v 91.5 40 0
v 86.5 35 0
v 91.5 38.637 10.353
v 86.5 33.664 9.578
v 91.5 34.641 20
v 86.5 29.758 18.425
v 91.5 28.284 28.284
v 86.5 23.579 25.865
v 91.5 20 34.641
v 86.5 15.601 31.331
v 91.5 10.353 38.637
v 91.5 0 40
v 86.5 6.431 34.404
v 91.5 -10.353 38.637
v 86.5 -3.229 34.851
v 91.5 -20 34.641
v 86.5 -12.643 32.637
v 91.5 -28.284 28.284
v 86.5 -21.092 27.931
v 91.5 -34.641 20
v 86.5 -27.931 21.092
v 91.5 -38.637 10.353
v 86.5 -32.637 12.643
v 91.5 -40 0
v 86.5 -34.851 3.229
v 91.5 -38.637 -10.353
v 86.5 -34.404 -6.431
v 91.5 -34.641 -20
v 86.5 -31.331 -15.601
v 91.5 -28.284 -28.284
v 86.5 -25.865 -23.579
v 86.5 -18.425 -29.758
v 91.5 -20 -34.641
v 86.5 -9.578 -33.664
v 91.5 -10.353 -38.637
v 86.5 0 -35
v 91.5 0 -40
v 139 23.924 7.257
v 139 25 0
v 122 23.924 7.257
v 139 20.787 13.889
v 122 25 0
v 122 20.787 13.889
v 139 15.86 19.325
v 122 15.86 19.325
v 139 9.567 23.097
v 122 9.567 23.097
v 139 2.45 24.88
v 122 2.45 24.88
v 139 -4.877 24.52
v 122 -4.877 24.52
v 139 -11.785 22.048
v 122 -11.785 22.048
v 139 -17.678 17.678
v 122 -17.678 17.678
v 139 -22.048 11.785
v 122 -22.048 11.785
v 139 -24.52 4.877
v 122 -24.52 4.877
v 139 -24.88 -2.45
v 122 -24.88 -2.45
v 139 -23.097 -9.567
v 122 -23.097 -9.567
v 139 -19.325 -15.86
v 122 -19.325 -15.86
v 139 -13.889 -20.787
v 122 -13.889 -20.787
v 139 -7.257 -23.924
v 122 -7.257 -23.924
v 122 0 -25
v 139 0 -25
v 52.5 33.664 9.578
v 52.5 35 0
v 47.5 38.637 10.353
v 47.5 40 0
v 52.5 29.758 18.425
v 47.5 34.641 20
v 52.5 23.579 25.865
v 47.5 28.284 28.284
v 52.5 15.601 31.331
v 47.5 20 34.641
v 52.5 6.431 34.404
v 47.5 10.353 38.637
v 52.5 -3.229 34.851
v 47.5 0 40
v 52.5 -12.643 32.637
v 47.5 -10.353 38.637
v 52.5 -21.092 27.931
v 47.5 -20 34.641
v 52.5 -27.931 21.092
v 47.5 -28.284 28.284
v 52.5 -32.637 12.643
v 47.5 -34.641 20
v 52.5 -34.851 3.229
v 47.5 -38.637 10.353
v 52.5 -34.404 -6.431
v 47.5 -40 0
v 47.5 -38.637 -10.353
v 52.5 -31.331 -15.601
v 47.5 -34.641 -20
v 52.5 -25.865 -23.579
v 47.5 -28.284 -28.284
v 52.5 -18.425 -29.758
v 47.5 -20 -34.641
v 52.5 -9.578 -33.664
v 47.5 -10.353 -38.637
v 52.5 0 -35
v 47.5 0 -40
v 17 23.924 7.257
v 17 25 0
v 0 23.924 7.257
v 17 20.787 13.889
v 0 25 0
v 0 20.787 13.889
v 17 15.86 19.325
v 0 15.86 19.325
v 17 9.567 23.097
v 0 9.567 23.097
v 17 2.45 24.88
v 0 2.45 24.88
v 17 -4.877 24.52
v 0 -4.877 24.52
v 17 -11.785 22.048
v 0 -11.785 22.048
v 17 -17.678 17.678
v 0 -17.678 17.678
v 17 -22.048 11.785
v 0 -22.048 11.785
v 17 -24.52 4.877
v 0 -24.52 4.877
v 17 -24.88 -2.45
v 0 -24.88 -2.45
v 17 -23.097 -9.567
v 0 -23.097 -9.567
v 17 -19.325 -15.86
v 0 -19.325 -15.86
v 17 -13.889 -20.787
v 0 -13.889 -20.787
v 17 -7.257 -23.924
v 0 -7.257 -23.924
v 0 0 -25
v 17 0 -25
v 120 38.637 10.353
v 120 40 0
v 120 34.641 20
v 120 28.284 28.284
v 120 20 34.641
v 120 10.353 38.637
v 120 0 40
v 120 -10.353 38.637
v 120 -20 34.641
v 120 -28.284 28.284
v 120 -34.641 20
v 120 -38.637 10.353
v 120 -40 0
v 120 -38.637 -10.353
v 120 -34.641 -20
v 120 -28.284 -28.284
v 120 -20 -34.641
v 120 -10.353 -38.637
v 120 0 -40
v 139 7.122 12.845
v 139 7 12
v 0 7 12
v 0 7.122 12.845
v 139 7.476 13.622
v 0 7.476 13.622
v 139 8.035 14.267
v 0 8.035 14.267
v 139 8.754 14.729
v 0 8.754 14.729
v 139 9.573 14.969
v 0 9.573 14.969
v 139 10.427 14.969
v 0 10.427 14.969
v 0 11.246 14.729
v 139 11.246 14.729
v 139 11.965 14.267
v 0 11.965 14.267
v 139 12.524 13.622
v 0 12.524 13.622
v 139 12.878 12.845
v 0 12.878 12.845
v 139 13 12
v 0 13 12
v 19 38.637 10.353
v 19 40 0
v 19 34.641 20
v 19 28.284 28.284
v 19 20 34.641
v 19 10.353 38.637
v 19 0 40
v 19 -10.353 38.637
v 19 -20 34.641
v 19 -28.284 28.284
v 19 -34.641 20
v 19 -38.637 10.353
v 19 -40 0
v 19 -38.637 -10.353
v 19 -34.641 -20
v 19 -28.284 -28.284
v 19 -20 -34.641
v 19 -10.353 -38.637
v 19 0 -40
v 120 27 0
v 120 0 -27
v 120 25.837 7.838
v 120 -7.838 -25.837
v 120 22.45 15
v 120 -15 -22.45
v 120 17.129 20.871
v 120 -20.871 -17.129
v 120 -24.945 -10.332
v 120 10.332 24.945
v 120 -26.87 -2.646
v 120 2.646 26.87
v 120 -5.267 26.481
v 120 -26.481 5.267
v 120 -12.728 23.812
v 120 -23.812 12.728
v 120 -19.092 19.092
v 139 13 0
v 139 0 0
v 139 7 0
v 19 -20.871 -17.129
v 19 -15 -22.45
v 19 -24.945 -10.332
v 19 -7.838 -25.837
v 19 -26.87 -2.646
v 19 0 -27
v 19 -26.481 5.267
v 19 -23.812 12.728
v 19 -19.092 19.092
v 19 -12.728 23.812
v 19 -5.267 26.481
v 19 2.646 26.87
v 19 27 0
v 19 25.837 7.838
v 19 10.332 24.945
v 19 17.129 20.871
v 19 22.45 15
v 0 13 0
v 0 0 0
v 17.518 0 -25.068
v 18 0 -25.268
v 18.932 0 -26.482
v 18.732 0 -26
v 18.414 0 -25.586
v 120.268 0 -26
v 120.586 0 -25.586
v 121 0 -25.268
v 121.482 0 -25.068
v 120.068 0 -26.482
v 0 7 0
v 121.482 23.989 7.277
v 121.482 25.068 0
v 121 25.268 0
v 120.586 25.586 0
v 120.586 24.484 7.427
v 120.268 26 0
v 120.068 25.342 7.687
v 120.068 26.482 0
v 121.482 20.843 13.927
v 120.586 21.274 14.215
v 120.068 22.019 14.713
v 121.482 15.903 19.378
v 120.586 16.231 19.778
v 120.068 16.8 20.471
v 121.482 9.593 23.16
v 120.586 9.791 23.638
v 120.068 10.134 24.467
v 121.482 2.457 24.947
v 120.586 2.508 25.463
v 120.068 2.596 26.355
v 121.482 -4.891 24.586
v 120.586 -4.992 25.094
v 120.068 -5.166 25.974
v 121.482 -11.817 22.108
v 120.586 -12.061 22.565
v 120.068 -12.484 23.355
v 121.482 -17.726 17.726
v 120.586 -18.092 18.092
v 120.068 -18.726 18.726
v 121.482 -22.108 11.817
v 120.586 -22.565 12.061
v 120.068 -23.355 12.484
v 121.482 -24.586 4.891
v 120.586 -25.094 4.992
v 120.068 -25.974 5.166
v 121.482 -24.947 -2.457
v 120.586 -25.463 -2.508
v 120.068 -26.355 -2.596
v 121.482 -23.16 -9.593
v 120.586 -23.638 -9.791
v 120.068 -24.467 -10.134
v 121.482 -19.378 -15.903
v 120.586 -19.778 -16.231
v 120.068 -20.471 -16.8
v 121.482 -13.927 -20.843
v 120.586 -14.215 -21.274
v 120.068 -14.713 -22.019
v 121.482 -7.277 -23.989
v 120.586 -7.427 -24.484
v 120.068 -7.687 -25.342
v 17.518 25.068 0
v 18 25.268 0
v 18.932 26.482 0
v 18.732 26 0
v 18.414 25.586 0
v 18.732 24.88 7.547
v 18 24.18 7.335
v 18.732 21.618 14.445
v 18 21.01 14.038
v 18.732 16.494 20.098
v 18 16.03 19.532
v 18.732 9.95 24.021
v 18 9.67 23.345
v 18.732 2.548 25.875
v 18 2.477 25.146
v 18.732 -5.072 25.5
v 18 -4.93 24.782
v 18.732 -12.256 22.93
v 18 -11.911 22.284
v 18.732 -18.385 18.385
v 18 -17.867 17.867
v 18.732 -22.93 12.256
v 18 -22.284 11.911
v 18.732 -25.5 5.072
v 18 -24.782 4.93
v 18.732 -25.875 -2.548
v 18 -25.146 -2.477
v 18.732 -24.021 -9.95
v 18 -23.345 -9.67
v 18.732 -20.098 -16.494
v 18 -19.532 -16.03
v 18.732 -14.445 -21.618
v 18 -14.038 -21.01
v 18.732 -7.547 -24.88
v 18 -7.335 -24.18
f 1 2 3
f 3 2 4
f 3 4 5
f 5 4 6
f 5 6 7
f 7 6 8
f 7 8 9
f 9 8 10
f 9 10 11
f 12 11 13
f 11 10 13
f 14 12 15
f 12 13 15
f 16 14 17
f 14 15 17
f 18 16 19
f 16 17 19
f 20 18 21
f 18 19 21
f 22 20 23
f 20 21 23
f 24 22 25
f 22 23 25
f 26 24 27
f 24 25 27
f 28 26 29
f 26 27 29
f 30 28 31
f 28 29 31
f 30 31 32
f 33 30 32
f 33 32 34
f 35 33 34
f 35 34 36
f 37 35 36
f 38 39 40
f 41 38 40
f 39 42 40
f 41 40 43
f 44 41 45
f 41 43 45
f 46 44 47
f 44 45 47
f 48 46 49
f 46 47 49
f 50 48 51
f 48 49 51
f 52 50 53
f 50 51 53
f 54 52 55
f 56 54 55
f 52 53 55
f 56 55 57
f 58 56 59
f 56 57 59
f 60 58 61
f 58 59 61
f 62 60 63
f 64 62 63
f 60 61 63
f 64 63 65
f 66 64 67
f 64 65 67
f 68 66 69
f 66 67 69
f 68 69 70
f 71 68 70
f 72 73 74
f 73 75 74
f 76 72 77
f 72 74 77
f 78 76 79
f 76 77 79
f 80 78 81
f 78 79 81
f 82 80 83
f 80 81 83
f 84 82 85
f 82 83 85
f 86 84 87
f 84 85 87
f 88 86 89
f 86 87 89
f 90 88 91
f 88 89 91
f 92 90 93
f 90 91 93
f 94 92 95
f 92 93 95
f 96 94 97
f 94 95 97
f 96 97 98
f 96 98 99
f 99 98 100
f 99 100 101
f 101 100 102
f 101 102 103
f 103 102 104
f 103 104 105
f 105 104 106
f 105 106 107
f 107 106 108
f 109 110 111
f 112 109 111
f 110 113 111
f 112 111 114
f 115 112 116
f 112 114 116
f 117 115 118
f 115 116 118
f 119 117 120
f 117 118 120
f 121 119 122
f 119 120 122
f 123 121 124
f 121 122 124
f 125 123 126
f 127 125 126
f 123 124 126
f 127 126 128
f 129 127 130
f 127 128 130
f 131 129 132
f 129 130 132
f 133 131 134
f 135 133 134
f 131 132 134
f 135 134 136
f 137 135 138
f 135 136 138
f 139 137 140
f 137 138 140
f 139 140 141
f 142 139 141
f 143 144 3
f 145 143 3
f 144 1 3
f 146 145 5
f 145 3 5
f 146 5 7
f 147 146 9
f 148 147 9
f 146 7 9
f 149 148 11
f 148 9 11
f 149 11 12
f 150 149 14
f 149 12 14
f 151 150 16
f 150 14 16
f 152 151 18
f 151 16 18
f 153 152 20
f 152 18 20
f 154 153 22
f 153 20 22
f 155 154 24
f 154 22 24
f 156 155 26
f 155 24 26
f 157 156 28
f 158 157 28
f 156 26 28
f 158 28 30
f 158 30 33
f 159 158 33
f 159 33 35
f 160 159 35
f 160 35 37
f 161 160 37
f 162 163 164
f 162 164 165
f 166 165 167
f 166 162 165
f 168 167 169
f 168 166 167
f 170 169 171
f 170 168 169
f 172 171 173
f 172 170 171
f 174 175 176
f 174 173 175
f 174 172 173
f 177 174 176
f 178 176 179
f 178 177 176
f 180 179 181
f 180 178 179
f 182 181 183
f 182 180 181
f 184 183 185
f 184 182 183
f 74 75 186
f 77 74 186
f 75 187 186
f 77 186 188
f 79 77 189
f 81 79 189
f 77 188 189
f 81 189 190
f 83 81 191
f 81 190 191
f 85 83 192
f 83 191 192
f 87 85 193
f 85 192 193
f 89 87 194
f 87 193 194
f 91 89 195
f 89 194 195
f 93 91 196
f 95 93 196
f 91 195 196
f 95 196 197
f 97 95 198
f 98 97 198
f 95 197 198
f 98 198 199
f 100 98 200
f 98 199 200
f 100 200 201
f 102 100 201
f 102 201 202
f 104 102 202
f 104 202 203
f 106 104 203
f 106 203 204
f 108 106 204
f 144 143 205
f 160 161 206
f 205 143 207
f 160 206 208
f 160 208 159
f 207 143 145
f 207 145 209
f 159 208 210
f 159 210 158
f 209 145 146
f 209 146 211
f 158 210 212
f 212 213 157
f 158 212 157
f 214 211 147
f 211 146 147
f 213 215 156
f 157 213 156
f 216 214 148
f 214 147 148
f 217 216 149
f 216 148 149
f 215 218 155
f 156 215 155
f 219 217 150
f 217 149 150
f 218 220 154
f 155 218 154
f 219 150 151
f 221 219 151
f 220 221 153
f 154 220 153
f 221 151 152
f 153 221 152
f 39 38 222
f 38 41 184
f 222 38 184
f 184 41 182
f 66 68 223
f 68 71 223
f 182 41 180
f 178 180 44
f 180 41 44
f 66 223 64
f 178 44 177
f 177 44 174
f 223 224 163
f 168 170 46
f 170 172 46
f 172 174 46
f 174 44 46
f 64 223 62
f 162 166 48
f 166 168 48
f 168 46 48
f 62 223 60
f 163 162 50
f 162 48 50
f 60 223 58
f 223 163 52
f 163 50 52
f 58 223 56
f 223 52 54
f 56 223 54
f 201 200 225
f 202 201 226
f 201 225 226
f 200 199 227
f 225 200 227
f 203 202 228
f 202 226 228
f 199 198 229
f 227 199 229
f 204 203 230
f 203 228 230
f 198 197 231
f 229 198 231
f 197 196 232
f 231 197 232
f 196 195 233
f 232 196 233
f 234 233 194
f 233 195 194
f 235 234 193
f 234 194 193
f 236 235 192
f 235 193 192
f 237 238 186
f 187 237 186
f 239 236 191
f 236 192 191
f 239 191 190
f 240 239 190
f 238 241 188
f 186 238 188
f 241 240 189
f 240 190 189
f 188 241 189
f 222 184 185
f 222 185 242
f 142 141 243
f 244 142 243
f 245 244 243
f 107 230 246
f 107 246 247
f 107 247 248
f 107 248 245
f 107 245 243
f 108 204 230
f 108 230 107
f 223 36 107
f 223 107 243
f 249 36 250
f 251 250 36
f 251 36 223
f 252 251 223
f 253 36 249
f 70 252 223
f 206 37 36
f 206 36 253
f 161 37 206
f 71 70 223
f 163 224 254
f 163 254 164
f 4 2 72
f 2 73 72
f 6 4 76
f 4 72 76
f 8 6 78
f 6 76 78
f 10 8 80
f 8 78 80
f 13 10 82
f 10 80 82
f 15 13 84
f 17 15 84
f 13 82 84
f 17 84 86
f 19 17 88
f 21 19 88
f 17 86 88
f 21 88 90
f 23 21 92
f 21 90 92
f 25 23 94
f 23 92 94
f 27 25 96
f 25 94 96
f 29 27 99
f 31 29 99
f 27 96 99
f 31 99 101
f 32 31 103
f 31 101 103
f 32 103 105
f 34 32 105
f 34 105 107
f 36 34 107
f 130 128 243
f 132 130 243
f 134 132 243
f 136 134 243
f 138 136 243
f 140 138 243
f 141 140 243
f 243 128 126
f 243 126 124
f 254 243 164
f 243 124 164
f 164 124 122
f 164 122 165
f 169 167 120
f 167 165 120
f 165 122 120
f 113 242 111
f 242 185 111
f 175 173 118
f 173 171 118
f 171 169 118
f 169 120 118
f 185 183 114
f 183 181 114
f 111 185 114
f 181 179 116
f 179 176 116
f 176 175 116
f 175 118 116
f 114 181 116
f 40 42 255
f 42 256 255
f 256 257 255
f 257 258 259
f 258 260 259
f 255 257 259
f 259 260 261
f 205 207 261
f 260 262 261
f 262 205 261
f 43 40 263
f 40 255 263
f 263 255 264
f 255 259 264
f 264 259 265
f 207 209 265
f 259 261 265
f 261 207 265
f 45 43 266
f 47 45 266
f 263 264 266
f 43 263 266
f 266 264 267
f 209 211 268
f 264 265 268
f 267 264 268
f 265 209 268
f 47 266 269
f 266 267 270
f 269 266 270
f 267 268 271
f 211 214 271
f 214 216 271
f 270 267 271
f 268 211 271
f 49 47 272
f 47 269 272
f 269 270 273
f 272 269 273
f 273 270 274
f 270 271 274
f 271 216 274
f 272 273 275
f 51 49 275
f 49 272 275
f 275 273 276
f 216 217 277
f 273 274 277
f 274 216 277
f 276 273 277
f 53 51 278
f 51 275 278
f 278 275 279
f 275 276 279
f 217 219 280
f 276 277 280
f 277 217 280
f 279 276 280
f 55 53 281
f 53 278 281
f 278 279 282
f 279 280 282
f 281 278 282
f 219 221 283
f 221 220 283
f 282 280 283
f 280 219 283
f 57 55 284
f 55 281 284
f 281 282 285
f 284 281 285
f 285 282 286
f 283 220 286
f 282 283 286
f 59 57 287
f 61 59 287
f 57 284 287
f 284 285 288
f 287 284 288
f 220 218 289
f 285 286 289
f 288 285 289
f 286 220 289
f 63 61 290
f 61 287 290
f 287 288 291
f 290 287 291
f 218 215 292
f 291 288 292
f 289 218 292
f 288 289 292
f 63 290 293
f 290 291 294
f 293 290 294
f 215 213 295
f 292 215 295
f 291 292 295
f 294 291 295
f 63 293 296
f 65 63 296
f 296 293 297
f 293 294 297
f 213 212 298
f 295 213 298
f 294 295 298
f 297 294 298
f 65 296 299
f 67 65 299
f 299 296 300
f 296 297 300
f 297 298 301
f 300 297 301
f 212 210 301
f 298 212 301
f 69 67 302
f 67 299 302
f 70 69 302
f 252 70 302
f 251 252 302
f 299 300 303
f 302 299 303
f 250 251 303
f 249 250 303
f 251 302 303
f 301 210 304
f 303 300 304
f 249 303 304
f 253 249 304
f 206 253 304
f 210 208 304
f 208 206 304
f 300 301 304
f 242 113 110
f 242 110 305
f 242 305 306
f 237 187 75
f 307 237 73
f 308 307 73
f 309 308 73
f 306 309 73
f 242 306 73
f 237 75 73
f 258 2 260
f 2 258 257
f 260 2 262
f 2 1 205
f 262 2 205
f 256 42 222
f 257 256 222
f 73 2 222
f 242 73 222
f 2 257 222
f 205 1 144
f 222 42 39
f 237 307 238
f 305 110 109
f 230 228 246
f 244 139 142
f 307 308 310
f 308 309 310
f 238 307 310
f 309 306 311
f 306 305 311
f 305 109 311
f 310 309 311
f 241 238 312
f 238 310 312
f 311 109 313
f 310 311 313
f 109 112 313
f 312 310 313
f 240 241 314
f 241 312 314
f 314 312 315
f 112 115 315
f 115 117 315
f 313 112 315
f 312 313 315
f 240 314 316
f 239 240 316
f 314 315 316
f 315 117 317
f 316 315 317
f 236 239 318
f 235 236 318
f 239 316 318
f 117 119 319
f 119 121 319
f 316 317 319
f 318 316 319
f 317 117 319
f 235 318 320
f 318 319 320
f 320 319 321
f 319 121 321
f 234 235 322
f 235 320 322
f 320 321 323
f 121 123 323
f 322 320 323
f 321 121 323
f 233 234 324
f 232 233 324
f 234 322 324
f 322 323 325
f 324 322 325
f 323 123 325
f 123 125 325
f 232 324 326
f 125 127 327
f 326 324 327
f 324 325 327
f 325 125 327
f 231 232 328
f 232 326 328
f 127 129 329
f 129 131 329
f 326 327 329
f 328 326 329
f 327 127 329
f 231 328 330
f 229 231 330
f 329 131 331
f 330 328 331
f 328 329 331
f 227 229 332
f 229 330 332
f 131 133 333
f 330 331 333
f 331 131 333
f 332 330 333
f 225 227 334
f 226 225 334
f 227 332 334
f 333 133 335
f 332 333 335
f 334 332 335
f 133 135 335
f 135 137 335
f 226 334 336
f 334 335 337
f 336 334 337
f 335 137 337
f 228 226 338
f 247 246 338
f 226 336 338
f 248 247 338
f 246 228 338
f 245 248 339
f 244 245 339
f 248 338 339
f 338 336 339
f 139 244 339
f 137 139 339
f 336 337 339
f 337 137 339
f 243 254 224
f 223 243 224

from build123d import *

# Parameters (mm, degrees)
REVOLVE2_ANGLE     = 270
CUT_EXTRUDE1_DEPTH = 151.069983674


with BuildPart() as part:
    # Sketch1 → Revolve2 (revolve)
    with BuildSketch(Plane.XY):
        with BuildLine():
            Line((0, 0), (139, 0))
            Line((139, 0), (139, 25))
            Line((139, 25), (122, 25))
            ThreePointArc((122, 25), (120.585786438, 25.585786438), (120, 27))
            Line((120, 27), (120, 40))
            Line((120, 40), (91.5, 40))
            Line((91.5, 40), (86.5, 35))
            Line((86.5, 35), (52.5, 35))
            Line((52.5, 35), (47.5, 40))
            Line((47.5, 40), (19, 40))
            Line((19, 40), (19, 27))
            ThreePointArc((19, 27), (18.414213562, 25.585786438), (17, 25))
            Line((17, 25), (0, 25))
            Line((0, 25), (0, 0))
        make_face()
    revolve(axis=Axis((0, 0, 0), (1, 0, 0)), revolution_arc=REVOLVE2_ANGLE)

    # Sketch2 → Cut-Extrude1 (cut, through all)
    with BuildSketch(Plane(origin=(139, 0, 0), x_dir=(0, 0, -1), z_dir=(1, 0, 0))):
        with BuildLine():
            Line((0, 7), (-12, 7))
            ThreePointArc((-12, 7), (-15, 10), (-12, 13))
            Line((-12, 13), (0, 13))
            Line((0, 13), (0, 7))
        make_face()
    extrude(amount=-CUT_EXTRUDE1_DEPTH, mode=Mode.SUBTRACT)


solid = part.part
